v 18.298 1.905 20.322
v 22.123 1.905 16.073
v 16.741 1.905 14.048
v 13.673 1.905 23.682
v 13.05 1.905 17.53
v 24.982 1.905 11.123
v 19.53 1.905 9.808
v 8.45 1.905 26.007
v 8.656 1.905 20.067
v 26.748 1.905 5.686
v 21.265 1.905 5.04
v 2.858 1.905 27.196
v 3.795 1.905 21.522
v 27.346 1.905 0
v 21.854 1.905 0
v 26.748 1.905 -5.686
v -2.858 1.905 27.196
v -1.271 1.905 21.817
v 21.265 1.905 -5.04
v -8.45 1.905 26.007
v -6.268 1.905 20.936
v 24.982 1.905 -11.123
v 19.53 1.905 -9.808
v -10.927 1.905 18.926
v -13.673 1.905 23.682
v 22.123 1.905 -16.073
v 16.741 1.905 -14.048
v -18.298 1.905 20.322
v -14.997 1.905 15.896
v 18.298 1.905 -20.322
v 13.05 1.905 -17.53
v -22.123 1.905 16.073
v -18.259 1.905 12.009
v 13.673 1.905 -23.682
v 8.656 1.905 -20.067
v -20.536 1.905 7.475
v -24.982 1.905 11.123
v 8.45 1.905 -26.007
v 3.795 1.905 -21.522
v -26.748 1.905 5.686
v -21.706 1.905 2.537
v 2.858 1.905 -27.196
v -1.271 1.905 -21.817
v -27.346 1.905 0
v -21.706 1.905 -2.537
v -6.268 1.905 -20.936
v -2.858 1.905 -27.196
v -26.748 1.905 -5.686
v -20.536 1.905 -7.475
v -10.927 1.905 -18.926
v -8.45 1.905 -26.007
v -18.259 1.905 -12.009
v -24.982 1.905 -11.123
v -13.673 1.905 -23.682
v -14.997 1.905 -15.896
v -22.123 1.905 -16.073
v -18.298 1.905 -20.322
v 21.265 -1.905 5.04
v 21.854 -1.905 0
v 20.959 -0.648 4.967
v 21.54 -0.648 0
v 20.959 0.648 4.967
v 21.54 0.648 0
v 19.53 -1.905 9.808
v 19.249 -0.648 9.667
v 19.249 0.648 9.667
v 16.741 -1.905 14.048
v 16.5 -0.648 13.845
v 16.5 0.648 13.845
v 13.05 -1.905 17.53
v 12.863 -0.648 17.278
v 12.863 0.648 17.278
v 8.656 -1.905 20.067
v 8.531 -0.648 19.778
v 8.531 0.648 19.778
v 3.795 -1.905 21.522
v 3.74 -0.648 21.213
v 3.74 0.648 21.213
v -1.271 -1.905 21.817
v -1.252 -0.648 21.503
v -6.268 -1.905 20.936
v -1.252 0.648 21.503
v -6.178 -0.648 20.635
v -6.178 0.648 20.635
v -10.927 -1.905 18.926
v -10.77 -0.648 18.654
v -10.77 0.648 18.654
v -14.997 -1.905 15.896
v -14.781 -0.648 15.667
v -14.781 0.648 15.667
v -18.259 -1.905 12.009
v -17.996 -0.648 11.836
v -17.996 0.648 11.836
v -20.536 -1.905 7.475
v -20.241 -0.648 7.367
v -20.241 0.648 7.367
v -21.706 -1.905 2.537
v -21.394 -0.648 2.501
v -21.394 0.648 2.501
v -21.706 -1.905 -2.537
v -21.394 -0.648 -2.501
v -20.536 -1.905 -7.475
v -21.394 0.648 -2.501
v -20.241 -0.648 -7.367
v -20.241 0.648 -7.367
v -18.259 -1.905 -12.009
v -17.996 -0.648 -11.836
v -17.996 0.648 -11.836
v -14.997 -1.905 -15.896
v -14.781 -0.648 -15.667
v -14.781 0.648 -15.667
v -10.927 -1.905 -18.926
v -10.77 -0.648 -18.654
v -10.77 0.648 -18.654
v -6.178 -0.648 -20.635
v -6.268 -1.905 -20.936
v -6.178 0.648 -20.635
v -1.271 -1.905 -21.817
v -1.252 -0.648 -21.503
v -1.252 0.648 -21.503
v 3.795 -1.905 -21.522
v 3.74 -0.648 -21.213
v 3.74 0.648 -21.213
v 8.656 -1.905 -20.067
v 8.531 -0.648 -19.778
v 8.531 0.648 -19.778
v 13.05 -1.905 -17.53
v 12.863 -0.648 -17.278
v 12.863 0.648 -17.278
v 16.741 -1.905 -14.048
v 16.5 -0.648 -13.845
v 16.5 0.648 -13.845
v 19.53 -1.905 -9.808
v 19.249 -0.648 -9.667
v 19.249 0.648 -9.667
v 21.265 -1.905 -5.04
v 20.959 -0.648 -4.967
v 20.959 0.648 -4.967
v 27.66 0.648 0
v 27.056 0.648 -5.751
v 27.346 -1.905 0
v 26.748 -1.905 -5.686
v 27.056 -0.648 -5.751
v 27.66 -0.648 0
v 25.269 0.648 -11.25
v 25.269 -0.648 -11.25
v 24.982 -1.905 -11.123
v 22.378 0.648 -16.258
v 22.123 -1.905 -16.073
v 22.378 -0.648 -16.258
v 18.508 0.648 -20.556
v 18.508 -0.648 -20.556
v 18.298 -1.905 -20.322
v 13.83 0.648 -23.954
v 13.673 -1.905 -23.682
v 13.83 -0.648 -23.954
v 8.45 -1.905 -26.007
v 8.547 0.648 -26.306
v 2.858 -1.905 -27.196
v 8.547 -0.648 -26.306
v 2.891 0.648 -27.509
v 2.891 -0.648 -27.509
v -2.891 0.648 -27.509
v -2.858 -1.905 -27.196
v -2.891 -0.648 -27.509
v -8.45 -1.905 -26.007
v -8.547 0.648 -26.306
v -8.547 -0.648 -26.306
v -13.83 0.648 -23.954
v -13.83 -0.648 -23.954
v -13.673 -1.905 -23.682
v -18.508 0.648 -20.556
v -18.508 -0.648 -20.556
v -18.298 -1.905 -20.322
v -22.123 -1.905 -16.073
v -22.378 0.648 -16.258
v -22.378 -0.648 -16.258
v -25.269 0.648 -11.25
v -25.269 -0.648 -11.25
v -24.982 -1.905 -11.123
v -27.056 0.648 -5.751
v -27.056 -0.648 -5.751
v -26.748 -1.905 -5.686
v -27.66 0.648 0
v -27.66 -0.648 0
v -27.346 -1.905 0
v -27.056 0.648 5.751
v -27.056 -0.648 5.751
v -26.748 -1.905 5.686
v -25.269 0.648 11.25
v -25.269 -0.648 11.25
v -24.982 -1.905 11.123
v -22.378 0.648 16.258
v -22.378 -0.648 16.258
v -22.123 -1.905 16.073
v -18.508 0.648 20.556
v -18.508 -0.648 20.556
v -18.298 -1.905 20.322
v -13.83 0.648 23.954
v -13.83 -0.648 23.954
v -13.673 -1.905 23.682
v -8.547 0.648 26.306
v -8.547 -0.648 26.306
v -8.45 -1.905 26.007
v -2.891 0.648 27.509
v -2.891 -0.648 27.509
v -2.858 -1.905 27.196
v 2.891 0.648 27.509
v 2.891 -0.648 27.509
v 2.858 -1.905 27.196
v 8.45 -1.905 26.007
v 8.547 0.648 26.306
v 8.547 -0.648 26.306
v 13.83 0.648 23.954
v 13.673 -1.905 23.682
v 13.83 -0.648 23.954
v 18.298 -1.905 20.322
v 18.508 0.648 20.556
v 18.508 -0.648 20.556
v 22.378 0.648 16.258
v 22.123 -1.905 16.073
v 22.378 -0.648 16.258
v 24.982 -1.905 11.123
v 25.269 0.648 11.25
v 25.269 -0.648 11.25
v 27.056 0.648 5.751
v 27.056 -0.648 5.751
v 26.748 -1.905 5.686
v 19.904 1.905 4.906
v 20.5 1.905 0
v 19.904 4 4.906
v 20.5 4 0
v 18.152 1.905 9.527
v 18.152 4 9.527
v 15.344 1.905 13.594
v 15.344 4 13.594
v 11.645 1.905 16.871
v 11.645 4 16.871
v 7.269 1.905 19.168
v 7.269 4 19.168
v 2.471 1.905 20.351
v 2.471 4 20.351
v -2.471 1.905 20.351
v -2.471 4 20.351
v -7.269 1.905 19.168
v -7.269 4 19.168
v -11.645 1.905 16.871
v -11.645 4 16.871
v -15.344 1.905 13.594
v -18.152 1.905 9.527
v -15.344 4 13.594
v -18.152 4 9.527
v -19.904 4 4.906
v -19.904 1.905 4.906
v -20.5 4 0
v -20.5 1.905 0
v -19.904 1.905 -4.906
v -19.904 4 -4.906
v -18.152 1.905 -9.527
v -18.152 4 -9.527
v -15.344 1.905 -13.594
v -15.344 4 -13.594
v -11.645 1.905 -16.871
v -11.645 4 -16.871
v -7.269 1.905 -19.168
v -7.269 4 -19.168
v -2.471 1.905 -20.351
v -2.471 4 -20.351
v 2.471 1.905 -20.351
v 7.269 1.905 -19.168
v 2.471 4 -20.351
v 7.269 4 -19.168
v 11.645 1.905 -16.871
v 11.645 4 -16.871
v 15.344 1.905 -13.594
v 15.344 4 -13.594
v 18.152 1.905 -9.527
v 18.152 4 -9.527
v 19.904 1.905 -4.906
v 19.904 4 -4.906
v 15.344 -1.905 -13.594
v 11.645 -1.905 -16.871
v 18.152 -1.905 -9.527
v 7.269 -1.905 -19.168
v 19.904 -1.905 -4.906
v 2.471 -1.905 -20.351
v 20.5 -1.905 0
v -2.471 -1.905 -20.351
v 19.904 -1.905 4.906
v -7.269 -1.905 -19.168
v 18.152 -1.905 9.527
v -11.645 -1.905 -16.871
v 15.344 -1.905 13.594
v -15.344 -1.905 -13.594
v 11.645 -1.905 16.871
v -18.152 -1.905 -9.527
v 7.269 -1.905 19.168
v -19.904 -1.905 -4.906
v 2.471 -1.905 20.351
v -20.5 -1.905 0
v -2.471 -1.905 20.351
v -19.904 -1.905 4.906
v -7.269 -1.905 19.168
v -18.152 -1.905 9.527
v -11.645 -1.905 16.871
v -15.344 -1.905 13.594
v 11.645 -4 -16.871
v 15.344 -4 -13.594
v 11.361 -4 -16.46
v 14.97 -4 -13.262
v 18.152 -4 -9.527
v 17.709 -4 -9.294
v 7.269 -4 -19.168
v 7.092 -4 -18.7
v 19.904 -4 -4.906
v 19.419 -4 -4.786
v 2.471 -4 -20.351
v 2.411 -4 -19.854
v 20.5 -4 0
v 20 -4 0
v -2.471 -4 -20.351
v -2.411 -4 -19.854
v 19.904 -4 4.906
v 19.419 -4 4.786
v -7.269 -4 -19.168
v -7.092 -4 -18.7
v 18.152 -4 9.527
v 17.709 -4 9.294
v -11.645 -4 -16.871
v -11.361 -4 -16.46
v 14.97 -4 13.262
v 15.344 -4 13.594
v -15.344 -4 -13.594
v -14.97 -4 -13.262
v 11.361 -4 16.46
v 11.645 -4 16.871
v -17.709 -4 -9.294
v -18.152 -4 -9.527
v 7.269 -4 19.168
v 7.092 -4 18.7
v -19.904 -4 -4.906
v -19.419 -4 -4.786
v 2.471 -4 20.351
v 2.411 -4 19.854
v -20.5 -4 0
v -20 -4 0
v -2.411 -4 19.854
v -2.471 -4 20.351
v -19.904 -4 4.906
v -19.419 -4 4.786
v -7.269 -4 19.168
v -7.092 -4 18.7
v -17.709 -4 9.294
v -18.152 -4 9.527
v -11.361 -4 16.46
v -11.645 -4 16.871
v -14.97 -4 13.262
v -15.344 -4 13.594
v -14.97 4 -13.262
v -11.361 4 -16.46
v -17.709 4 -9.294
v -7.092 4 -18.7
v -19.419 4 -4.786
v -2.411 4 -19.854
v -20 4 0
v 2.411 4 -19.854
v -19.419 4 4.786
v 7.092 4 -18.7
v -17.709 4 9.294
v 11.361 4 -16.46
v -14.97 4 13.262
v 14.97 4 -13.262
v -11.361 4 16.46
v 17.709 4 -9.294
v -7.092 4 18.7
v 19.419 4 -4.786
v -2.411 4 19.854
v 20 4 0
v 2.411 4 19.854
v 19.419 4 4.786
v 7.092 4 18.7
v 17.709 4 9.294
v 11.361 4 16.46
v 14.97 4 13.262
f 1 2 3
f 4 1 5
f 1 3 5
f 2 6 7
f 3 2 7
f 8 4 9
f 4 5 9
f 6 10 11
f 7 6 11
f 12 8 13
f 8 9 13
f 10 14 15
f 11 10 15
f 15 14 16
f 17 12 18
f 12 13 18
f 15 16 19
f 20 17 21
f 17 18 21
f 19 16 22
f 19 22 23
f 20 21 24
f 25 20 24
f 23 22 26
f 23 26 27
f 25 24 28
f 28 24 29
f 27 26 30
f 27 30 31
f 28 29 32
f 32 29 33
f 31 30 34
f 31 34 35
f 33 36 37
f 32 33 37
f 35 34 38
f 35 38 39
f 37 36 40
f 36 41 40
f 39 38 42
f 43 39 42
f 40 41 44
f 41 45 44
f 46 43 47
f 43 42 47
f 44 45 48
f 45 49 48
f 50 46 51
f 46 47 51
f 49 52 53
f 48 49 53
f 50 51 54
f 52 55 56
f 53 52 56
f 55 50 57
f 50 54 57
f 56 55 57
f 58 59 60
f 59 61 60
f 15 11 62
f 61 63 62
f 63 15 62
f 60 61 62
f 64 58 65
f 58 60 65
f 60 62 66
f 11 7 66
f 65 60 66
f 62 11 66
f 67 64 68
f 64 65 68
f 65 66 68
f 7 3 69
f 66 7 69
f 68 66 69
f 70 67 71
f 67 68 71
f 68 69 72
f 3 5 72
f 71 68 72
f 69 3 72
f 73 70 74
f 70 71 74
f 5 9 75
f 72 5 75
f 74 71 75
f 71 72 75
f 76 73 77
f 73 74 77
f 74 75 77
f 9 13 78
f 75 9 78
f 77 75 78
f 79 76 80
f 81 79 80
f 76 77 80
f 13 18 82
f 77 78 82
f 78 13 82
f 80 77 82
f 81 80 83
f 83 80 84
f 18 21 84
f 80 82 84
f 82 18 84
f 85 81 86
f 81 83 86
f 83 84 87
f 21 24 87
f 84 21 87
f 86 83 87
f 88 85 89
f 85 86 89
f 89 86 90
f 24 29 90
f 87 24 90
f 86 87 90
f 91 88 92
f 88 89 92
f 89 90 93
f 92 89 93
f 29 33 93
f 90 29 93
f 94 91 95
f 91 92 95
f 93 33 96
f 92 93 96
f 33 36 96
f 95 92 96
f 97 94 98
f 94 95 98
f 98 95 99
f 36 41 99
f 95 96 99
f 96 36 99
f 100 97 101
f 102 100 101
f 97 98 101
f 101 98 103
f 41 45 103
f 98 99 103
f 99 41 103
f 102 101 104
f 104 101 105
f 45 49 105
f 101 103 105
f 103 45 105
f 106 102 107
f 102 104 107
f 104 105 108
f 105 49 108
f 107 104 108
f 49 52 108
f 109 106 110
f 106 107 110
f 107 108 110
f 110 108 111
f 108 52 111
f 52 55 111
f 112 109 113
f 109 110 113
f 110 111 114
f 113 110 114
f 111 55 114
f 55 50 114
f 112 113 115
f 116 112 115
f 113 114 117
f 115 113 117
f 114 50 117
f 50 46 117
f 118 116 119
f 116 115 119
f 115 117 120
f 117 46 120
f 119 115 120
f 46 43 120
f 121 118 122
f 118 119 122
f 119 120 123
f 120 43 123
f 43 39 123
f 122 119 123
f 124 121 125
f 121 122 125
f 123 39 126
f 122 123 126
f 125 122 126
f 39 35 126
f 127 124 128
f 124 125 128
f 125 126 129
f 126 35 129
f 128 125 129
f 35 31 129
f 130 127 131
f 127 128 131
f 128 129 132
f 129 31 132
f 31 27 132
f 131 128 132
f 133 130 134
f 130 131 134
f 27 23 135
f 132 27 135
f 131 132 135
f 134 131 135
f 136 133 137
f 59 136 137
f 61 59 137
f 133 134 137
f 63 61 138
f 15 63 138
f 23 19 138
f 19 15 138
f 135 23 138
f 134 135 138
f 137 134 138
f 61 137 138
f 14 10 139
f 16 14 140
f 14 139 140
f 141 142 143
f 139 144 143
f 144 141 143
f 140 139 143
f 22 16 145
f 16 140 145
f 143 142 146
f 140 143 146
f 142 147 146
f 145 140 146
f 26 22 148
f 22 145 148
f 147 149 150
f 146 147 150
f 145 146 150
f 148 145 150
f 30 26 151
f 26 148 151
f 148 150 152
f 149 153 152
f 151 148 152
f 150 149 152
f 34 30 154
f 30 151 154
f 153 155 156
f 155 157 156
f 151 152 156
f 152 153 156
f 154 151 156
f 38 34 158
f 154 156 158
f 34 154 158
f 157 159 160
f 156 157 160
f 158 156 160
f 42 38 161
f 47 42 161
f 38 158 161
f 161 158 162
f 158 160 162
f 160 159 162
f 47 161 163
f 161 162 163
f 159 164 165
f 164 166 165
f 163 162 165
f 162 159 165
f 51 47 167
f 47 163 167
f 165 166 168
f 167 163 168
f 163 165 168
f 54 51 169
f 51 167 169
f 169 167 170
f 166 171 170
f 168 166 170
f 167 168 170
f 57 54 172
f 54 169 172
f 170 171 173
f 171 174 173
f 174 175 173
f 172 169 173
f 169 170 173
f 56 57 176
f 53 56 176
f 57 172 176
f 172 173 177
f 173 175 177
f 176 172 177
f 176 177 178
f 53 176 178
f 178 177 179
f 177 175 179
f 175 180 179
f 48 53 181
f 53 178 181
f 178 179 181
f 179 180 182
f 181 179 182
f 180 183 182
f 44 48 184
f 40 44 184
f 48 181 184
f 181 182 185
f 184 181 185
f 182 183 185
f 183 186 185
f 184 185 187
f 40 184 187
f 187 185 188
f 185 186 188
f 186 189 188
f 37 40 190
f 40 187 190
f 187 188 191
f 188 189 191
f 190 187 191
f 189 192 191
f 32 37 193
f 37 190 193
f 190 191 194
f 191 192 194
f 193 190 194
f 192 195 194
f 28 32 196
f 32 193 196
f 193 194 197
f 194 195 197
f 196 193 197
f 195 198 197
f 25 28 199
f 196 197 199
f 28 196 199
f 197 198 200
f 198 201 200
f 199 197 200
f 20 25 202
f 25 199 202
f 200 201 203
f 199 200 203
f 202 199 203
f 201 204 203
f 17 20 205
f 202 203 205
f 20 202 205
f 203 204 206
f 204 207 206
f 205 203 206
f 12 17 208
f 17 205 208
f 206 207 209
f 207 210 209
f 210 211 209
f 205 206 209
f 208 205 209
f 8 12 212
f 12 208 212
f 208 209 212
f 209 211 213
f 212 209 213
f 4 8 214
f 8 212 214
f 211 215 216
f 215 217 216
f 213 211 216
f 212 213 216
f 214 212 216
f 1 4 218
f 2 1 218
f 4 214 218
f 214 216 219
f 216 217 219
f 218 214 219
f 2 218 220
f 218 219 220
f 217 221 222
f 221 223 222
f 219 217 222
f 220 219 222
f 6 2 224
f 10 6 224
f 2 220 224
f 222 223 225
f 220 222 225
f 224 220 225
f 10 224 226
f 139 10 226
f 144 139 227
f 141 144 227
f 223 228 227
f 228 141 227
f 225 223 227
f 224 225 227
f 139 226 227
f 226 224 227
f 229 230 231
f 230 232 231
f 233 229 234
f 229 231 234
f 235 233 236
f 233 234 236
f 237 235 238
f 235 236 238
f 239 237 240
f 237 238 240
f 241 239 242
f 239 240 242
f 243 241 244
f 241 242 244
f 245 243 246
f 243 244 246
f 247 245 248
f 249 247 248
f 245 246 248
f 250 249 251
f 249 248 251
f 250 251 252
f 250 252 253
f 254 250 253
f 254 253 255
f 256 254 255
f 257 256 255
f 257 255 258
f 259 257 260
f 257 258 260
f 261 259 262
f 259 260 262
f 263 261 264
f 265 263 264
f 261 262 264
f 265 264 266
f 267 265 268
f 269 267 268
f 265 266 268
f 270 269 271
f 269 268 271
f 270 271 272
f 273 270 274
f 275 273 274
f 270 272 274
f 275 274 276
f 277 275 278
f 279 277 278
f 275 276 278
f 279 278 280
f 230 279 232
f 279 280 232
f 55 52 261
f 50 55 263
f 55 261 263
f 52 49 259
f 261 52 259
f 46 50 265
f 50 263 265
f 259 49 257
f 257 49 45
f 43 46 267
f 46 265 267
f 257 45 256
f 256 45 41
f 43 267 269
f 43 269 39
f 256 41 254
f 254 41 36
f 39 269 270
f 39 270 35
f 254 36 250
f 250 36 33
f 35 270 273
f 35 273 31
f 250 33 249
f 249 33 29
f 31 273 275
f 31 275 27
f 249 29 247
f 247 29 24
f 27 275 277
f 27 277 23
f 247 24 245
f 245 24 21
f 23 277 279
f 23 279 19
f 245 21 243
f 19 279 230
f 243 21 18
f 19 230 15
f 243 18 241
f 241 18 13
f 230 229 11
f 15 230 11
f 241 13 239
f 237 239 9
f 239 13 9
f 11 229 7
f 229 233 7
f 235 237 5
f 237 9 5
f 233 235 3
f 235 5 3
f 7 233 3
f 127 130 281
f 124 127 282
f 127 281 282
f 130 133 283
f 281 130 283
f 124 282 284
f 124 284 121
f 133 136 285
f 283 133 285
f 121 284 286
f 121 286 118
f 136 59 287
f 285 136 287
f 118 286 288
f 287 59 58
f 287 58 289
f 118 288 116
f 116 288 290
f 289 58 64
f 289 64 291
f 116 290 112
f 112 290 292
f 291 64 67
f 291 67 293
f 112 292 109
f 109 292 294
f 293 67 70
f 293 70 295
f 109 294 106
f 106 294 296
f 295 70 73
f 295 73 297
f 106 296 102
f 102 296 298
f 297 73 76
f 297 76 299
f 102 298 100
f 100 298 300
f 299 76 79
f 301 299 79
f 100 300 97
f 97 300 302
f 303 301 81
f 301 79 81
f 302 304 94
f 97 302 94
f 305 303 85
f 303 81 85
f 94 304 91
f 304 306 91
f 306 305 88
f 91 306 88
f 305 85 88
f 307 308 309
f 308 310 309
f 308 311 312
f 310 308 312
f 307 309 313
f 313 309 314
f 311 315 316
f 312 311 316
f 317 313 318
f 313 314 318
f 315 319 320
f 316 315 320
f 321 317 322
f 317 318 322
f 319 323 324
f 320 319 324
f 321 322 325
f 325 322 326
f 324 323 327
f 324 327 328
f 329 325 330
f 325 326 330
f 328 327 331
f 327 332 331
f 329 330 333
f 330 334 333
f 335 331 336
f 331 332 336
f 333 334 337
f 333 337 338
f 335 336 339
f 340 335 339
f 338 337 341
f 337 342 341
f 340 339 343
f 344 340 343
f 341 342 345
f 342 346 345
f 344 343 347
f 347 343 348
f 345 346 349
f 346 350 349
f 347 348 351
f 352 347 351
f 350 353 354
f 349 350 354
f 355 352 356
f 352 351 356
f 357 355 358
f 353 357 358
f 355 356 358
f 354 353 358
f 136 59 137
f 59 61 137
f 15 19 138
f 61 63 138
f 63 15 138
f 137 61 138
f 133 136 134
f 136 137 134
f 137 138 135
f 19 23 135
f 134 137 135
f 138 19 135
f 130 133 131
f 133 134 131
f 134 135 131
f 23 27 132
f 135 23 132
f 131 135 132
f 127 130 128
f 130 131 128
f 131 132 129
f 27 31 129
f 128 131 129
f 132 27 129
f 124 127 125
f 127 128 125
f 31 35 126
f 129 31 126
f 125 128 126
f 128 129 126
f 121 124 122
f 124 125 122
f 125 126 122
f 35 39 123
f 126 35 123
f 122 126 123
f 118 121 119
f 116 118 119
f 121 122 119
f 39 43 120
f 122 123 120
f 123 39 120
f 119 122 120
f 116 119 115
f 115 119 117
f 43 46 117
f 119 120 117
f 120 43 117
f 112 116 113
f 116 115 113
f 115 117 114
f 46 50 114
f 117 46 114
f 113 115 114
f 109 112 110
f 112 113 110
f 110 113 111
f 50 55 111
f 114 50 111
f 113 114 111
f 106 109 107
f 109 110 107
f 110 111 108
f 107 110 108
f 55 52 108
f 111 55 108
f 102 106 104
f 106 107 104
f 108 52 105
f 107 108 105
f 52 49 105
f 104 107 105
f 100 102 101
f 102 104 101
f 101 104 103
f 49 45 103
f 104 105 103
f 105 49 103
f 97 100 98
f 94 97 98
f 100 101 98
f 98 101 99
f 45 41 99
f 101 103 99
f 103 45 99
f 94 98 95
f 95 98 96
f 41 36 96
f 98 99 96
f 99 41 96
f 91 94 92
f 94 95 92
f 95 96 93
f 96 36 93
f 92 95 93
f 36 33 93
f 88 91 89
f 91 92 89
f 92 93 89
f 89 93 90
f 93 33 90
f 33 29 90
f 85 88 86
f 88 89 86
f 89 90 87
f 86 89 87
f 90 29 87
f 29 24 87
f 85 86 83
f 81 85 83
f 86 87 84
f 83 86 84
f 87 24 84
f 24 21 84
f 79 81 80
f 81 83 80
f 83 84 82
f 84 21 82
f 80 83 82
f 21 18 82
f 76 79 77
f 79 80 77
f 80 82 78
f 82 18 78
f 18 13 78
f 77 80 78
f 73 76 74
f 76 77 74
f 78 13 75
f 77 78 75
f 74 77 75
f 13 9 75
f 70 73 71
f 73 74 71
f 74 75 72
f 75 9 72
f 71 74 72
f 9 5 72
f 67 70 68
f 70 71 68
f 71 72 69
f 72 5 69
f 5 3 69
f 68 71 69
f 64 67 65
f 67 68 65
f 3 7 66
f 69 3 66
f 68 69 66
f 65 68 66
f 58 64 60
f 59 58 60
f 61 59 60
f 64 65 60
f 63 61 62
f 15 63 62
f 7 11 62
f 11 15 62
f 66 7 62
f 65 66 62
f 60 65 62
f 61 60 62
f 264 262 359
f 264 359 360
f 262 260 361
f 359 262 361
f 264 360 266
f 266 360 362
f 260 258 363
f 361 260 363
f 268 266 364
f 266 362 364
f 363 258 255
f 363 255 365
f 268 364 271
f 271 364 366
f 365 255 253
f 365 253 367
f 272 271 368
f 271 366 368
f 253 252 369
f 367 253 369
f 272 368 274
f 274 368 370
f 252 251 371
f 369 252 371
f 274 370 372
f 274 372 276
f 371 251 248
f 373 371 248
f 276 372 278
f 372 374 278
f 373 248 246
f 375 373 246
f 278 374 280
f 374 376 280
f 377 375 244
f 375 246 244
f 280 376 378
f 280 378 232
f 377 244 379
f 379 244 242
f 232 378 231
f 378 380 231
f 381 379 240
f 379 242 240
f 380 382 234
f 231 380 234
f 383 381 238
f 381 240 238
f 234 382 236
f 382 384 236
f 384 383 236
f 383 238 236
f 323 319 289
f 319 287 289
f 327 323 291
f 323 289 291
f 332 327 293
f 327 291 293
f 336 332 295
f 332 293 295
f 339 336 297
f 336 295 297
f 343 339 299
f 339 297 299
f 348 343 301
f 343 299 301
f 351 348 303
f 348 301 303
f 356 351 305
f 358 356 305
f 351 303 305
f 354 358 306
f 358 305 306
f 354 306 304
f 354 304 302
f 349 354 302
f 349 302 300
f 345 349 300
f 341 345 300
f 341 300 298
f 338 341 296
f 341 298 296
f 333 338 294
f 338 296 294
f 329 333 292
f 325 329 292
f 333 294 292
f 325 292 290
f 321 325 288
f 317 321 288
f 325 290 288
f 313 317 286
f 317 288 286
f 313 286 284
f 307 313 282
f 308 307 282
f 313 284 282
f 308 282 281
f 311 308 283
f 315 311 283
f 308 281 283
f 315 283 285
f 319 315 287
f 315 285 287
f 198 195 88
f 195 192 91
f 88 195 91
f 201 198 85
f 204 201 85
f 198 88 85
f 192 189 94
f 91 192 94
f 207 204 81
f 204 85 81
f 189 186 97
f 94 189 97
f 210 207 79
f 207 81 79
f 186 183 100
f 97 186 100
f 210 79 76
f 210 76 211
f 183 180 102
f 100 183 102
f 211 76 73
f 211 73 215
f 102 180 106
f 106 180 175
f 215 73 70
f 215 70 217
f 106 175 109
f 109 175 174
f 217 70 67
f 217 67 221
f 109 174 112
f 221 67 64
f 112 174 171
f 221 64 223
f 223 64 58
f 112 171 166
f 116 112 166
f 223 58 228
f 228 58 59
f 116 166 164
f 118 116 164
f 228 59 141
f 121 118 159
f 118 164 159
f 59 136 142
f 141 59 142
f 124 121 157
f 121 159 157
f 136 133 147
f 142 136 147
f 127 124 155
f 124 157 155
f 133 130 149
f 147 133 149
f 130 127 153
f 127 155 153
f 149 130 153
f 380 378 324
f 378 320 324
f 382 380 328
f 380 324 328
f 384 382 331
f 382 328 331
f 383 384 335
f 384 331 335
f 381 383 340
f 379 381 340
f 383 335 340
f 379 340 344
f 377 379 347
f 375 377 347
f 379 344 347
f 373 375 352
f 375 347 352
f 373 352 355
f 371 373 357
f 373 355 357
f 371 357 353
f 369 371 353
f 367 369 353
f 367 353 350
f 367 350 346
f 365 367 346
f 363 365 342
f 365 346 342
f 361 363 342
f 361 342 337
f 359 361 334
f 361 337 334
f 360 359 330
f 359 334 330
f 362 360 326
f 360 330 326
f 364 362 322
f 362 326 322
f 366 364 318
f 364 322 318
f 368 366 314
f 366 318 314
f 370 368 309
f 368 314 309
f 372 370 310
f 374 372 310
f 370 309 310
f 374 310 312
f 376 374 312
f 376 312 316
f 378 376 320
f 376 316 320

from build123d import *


with BuildPart() as part:
    # Sketch1 → Revolve1 (revolve)
    with BuildSketch(Plane.XY):
        with BuildLine():
            Line((20, 4), (20, -4))
            Line((20, -4), (20.5, -4))
            Line((20.5, -4), (20.5, -1.905))
            Line((20.5, -1.905), (21.854196223, -1.905))
            ThreePointArc((21.854196223, -1.905), (21.5, 0), (21.854196223, 1.905))
            Line((21.854196223, 1.905), (20.5, 1.905))
            Line((20.5, 1.905), (20.5, 4))
            Line((20.5, 4), (20, 4))
        make_face()
    revolve(axis=Axis((0, 4, 0), (0, -1, 0)))


with BuildPart() as body_2:
    # Sketch2 → Revolve2 (revolve)
    with BuildSketch(Plane.XY):
        with BuildLine():
            Line((21.854196223, 1.905), (27.345803777, 1.905))
            ThreePointArc((27.345803777, 1.905), (27.7, 0), (27.345803777, -1.905))
            Line((27.345803777, -1.905), (21.854196223, -1.905))
            ThreePointArc((21.854196223, -1.905), (21.5, 0), (21.854196223, 1.905))
        make_face()
    revolve(axis=Axis((0, -4, 0), (0, 1, 0)))


solid = Compound([part.part, body_2.part])
